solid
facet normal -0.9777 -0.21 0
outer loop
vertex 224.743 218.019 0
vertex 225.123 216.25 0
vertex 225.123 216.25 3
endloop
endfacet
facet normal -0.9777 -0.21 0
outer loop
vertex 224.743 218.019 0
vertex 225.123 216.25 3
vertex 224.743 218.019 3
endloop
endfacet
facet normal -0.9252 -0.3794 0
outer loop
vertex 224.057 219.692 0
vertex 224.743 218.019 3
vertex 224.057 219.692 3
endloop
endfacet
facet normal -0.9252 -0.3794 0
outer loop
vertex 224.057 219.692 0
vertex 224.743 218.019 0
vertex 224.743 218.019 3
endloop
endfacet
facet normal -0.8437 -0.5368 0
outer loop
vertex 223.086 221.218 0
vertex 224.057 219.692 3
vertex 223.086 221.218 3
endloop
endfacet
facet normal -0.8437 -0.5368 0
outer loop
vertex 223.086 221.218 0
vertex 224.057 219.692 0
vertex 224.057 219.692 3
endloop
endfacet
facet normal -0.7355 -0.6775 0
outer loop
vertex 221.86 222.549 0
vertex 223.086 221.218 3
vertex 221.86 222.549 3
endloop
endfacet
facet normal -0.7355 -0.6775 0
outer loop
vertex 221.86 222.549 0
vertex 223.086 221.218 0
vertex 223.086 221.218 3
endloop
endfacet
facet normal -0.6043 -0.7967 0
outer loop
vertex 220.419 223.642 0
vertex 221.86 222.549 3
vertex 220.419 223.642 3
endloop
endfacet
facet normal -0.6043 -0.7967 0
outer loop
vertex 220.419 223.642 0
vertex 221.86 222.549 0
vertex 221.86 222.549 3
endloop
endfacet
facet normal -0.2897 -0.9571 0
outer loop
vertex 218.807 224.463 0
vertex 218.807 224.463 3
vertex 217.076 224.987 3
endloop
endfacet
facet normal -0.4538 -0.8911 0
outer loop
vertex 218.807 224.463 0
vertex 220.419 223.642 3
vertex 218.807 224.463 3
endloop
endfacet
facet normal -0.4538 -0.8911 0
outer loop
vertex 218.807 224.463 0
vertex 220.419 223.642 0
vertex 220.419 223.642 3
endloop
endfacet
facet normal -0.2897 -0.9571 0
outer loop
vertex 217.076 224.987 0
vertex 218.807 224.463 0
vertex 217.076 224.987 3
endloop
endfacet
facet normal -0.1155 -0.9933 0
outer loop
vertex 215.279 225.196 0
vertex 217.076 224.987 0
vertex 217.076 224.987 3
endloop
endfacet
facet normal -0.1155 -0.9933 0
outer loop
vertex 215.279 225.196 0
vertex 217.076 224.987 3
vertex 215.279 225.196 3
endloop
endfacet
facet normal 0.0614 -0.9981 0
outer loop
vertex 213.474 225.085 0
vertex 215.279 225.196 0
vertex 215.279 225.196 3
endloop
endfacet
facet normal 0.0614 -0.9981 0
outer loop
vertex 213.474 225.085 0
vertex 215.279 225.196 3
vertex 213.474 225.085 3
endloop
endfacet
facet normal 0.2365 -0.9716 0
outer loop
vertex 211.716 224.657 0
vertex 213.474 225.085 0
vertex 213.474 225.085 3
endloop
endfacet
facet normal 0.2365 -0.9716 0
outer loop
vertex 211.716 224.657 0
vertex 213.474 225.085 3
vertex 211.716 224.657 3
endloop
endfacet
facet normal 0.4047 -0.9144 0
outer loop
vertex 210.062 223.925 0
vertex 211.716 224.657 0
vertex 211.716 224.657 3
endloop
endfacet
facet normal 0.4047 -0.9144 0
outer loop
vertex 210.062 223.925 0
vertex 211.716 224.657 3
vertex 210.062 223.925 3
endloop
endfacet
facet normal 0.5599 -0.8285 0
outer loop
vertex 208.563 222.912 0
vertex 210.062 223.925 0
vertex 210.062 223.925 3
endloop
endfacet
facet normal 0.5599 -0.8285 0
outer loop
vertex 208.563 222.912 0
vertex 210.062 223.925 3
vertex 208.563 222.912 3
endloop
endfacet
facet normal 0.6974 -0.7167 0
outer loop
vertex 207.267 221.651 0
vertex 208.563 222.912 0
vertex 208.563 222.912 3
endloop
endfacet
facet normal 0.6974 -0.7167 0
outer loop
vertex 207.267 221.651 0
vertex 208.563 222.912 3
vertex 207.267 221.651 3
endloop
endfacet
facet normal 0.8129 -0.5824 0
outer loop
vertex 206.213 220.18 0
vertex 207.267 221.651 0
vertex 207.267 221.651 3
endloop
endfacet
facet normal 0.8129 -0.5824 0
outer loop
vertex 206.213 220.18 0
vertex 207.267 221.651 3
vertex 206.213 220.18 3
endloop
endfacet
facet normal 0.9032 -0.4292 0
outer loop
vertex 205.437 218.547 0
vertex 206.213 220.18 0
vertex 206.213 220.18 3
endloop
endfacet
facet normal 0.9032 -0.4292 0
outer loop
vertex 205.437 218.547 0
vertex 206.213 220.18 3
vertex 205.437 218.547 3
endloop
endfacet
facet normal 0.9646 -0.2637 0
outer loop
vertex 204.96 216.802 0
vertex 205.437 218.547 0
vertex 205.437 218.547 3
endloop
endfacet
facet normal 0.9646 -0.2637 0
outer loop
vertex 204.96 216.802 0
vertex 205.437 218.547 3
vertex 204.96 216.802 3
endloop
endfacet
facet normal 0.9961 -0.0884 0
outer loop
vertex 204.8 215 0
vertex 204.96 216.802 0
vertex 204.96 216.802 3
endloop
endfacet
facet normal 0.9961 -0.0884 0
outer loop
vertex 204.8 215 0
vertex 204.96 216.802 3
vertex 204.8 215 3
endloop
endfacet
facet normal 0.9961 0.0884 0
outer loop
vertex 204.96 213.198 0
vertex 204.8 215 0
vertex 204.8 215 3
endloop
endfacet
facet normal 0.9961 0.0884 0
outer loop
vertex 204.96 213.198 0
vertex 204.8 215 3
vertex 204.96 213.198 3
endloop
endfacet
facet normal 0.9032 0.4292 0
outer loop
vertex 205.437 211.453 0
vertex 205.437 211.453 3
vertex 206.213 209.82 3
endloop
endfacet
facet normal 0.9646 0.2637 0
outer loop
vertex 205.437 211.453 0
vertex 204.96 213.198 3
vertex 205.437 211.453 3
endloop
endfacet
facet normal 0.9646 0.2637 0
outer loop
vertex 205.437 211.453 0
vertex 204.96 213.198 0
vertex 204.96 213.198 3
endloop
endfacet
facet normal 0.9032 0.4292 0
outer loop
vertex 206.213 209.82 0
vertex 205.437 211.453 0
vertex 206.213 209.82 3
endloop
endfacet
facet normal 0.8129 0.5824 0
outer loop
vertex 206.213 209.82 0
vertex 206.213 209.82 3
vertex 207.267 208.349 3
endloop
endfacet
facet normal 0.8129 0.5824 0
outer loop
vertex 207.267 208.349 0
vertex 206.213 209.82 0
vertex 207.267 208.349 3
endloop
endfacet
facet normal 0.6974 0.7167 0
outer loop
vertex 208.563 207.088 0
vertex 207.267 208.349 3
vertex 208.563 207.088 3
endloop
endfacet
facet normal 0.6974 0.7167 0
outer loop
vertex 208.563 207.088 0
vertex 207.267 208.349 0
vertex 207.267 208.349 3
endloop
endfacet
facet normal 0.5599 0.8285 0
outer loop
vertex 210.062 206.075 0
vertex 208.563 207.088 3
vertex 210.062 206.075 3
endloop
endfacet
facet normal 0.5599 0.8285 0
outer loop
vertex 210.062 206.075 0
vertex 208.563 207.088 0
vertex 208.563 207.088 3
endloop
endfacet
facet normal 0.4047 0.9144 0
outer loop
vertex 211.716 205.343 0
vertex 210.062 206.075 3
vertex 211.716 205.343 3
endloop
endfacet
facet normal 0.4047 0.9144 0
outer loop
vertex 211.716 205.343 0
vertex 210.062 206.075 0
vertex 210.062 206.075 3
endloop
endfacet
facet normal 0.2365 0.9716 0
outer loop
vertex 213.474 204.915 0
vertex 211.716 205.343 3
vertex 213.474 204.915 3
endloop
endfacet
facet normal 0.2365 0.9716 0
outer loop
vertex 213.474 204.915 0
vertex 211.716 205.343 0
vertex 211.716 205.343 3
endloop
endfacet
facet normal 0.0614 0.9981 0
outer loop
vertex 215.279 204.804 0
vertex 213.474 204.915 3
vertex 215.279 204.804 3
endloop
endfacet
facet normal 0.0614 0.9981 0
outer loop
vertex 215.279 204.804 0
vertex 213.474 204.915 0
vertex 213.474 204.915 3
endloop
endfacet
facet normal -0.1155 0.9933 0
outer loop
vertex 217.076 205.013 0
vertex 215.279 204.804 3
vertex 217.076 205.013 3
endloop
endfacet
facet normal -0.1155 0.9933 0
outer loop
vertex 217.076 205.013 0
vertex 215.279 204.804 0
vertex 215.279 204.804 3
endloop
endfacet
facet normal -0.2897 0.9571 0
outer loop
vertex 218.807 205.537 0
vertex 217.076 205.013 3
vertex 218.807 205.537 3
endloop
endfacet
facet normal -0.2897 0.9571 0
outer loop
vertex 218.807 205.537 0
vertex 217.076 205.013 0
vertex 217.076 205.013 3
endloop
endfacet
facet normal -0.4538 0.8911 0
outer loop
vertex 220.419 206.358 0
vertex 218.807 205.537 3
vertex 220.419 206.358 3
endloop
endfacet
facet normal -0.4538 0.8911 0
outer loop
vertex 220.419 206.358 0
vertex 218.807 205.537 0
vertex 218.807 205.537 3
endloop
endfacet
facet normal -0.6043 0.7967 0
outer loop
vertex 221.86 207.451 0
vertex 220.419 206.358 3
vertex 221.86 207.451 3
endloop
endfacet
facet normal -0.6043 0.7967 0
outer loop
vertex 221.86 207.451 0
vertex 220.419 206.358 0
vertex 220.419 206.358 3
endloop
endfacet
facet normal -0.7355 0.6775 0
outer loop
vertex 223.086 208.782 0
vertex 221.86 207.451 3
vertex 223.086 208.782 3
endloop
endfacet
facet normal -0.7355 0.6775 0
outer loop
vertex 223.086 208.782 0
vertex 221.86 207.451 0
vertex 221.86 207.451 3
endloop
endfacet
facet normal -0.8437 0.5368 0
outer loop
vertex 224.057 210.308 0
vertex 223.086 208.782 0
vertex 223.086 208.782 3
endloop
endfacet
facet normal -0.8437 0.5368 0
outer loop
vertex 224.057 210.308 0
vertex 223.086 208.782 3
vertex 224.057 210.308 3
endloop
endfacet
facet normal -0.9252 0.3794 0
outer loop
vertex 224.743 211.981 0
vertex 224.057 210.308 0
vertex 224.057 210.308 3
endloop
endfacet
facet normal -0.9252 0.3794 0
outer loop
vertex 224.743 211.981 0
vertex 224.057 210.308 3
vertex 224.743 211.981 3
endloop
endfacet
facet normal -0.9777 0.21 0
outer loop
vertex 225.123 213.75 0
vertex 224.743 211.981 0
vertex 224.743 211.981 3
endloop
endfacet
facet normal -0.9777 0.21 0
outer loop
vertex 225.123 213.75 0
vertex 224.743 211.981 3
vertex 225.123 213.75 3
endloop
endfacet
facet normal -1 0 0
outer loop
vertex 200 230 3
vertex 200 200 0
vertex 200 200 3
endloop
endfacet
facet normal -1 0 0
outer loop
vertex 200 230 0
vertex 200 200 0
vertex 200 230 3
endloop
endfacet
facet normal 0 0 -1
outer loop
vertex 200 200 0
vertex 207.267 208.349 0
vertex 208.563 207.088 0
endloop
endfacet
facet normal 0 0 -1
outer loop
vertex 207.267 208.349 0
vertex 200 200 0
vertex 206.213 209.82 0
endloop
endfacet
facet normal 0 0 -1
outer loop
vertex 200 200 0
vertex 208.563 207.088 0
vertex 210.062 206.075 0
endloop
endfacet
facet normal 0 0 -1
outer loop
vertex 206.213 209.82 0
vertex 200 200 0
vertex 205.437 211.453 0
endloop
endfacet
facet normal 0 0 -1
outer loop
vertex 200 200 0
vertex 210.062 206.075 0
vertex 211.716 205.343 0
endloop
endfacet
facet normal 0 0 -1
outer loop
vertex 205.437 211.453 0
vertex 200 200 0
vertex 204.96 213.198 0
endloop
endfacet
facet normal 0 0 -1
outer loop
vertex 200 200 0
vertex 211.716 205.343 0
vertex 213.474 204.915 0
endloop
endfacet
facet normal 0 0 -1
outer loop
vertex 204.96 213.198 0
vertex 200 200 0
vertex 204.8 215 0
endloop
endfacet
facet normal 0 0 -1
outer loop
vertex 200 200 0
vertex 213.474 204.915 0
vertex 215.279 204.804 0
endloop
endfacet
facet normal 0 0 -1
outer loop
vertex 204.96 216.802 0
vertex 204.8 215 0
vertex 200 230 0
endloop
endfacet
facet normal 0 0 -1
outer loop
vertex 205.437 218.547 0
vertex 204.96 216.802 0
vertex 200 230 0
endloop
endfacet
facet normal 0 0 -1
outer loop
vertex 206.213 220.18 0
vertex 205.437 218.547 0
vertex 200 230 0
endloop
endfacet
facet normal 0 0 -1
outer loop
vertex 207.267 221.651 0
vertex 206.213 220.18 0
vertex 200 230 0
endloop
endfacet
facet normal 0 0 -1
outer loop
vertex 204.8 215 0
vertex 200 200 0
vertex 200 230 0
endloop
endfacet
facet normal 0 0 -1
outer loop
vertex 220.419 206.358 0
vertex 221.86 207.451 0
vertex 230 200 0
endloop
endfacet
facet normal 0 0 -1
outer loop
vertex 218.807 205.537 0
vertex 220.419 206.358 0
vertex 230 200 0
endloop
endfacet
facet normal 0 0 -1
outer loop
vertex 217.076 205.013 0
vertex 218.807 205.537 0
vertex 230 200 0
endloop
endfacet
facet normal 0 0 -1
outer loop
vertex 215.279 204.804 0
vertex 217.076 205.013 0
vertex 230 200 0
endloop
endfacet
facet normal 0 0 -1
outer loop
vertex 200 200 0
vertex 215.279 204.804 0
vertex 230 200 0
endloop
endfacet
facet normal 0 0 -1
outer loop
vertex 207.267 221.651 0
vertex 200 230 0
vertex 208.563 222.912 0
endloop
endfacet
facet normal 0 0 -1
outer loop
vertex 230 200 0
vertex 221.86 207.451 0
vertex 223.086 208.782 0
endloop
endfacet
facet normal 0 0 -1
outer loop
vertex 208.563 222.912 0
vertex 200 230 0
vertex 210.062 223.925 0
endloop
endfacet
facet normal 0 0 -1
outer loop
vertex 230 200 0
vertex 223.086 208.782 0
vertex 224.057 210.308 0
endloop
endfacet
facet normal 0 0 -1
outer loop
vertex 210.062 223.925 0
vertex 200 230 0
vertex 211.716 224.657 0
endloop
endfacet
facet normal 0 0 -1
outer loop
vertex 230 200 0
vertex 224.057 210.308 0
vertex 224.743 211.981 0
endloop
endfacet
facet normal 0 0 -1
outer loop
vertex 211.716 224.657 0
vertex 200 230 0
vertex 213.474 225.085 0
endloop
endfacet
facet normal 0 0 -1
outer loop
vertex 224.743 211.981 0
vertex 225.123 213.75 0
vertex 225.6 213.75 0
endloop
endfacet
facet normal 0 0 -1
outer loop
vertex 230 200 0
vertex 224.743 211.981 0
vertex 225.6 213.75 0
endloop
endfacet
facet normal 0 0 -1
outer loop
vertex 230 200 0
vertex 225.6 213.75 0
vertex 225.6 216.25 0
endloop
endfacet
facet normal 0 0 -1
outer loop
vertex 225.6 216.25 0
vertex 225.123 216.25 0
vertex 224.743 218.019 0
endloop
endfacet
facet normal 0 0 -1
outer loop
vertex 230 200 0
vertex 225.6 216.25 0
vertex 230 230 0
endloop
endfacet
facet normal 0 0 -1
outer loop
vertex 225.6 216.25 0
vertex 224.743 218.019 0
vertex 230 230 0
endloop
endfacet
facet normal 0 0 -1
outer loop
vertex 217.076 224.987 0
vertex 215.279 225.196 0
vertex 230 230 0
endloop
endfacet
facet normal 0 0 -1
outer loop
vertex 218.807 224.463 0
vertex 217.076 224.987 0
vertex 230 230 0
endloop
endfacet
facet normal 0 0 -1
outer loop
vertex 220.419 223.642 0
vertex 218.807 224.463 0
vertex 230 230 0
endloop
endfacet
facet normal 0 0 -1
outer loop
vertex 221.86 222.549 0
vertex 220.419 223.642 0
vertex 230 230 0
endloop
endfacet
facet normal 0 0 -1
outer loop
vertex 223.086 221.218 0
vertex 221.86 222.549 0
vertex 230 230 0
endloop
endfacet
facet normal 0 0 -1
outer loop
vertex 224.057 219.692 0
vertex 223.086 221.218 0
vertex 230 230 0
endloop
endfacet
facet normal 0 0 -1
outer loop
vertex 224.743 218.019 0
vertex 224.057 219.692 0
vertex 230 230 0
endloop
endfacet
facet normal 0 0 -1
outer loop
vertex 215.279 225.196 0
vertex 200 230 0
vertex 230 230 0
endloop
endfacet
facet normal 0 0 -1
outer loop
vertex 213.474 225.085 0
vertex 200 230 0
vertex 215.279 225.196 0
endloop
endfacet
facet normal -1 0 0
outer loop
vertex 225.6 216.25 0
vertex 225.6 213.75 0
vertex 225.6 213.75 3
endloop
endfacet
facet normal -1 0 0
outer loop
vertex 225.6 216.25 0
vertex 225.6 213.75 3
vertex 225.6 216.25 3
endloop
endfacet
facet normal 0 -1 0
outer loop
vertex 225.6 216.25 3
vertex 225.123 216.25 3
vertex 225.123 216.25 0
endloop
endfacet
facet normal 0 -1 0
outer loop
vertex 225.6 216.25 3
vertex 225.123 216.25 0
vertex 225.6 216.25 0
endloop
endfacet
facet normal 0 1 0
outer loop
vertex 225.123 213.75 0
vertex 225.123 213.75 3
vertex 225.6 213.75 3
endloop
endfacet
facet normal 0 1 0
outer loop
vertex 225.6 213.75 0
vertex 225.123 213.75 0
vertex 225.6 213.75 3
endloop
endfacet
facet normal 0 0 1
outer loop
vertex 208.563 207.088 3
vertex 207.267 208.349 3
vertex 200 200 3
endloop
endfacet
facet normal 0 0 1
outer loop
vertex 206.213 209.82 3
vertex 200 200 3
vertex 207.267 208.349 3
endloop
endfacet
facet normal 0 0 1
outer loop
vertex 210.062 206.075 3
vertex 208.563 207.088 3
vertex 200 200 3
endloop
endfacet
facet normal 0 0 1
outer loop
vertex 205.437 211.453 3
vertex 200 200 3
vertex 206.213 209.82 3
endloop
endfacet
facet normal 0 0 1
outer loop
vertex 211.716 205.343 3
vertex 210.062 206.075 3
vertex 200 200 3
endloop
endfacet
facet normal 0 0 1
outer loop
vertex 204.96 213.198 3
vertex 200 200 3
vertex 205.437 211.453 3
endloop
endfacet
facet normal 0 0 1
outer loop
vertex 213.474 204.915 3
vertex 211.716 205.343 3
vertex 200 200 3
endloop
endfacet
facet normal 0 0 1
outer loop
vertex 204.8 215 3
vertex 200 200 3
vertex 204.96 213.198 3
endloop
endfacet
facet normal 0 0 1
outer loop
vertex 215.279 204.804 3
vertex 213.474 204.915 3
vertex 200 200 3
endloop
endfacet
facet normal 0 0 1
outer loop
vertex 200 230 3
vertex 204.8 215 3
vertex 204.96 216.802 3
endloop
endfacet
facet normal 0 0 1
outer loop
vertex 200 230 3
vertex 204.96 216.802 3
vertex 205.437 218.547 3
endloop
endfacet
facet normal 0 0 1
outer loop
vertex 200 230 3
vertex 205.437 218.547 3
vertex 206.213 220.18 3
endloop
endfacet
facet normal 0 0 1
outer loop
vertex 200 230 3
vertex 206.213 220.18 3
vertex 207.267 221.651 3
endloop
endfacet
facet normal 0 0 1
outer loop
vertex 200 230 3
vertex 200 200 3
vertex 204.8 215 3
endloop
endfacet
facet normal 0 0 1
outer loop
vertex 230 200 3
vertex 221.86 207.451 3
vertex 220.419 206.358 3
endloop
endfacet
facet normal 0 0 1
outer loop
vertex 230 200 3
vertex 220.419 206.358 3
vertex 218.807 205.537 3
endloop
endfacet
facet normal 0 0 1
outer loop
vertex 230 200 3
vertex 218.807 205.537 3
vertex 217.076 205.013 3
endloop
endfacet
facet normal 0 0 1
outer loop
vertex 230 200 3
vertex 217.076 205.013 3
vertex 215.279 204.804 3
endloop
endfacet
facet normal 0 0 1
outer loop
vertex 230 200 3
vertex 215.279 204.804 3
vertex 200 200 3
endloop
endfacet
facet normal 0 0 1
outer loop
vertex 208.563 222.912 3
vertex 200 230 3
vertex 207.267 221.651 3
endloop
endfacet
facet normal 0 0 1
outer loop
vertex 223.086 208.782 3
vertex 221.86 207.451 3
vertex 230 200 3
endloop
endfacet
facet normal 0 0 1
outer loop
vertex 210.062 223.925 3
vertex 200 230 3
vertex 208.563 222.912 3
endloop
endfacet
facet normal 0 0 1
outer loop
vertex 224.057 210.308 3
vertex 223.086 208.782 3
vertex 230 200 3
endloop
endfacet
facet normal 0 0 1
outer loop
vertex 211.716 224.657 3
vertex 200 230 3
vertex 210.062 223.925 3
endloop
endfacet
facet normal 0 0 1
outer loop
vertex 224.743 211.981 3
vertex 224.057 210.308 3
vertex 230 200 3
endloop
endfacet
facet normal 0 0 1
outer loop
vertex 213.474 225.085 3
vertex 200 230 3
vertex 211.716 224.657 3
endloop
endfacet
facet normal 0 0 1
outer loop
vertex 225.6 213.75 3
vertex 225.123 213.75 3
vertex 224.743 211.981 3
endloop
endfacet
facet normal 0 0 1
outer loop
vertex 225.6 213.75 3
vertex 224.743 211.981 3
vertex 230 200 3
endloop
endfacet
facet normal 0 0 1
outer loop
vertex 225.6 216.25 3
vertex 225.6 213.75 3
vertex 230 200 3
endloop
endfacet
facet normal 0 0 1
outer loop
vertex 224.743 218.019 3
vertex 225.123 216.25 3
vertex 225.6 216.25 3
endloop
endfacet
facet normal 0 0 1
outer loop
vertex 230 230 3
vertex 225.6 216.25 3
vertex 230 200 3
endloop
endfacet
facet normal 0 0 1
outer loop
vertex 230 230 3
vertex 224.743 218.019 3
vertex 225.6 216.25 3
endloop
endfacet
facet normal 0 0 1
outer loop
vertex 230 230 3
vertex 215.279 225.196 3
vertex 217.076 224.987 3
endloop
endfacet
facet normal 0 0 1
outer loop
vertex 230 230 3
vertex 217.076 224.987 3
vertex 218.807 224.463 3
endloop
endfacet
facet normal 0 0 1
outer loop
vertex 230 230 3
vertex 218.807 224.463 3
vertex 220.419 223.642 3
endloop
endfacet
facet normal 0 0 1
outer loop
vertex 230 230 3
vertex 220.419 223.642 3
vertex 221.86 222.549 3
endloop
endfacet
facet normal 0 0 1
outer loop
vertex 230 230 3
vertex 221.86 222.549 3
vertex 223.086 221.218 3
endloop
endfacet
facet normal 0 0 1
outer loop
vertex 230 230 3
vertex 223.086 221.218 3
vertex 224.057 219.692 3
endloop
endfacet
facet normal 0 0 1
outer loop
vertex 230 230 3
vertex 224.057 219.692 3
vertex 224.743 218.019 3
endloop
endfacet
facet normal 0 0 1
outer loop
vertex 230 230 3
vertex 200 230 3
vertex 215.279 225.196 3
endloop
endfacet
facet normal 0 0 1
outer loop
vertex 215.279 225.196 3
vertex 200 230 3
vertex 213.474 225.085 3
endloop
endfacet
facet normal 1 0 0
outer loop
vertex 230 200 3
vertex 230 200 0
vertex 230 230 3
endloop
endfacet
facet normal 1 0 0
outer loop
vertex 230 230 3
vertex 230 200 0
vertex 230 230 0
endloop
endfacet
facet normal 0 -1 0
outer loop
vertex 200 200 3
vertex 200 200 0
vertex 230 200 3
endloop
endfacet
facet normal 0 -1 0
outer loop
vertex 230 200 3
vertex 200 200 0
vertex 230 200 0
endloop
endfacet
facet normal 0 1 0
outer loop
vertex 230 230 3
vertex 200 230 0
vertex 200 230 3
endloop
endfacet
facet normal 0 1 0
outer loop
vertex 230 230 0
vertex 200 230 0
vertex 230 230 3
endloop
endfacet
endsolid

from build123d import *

# Parameters (mm, degrees)
BOX034_W          = 10
BOX034_H          = 2.5
BOX034_DEPTH      = 10
CYLINDER029_R     = 10.2
CYLINDER029_DEPTH = 10
BOX035_W          = 30
BOX035_H          = 30
BOX035_DEPTH      = 3


with BuildPart() as cube034:
    # Box034 → Box034 (new body)
    with BuildSketch(Plane(origin=(85.6, 163.75, -5), x_dir=(1, 0, 0), z_dir=(0, 0, 1))):
        with Locations((5, 1.25)):
            Rectangle(BOX034_W, BOX034_H)
    extrude(amount=BOX034_DEPTH)


with BuildPart() as powersw001:
    # Cylinder029 → Cylinder029 (new body)
    with BuildSketch(Plane(origin=(85, 165, -5), x_dir=(1, 0, 0), z_dir=(0, 0, 1))):
        Circle(CYLINDER029_R)
    extrude(amount=CYLINDER029_DEPTH)

    # Fusion001: union Cube034
    add(cube034.part)


with BuildPart() as powersw001_1:
    # Fusion001 placement: moved
    add(powersw001.part.moved(Location((130, 50, 0))))


with BuildPart() as powerswtest:
    # Box035 → Box035 (new body)
    with BuildSketch(Plane(origin=(200, 200, 0), x_dir=(1, 0, 0), z_dir=(0, 0, 1))):
        with Locations((15, 15)):
            Rectangle(BOX035_W, BOX035_H)
    extrude(amount=BOX035_DEPTH)

    # Cut044: cut PowerSw001
    add(powersw001_1.part, mode=Mode.SUBTRACT)


solid = powerswtest.part
